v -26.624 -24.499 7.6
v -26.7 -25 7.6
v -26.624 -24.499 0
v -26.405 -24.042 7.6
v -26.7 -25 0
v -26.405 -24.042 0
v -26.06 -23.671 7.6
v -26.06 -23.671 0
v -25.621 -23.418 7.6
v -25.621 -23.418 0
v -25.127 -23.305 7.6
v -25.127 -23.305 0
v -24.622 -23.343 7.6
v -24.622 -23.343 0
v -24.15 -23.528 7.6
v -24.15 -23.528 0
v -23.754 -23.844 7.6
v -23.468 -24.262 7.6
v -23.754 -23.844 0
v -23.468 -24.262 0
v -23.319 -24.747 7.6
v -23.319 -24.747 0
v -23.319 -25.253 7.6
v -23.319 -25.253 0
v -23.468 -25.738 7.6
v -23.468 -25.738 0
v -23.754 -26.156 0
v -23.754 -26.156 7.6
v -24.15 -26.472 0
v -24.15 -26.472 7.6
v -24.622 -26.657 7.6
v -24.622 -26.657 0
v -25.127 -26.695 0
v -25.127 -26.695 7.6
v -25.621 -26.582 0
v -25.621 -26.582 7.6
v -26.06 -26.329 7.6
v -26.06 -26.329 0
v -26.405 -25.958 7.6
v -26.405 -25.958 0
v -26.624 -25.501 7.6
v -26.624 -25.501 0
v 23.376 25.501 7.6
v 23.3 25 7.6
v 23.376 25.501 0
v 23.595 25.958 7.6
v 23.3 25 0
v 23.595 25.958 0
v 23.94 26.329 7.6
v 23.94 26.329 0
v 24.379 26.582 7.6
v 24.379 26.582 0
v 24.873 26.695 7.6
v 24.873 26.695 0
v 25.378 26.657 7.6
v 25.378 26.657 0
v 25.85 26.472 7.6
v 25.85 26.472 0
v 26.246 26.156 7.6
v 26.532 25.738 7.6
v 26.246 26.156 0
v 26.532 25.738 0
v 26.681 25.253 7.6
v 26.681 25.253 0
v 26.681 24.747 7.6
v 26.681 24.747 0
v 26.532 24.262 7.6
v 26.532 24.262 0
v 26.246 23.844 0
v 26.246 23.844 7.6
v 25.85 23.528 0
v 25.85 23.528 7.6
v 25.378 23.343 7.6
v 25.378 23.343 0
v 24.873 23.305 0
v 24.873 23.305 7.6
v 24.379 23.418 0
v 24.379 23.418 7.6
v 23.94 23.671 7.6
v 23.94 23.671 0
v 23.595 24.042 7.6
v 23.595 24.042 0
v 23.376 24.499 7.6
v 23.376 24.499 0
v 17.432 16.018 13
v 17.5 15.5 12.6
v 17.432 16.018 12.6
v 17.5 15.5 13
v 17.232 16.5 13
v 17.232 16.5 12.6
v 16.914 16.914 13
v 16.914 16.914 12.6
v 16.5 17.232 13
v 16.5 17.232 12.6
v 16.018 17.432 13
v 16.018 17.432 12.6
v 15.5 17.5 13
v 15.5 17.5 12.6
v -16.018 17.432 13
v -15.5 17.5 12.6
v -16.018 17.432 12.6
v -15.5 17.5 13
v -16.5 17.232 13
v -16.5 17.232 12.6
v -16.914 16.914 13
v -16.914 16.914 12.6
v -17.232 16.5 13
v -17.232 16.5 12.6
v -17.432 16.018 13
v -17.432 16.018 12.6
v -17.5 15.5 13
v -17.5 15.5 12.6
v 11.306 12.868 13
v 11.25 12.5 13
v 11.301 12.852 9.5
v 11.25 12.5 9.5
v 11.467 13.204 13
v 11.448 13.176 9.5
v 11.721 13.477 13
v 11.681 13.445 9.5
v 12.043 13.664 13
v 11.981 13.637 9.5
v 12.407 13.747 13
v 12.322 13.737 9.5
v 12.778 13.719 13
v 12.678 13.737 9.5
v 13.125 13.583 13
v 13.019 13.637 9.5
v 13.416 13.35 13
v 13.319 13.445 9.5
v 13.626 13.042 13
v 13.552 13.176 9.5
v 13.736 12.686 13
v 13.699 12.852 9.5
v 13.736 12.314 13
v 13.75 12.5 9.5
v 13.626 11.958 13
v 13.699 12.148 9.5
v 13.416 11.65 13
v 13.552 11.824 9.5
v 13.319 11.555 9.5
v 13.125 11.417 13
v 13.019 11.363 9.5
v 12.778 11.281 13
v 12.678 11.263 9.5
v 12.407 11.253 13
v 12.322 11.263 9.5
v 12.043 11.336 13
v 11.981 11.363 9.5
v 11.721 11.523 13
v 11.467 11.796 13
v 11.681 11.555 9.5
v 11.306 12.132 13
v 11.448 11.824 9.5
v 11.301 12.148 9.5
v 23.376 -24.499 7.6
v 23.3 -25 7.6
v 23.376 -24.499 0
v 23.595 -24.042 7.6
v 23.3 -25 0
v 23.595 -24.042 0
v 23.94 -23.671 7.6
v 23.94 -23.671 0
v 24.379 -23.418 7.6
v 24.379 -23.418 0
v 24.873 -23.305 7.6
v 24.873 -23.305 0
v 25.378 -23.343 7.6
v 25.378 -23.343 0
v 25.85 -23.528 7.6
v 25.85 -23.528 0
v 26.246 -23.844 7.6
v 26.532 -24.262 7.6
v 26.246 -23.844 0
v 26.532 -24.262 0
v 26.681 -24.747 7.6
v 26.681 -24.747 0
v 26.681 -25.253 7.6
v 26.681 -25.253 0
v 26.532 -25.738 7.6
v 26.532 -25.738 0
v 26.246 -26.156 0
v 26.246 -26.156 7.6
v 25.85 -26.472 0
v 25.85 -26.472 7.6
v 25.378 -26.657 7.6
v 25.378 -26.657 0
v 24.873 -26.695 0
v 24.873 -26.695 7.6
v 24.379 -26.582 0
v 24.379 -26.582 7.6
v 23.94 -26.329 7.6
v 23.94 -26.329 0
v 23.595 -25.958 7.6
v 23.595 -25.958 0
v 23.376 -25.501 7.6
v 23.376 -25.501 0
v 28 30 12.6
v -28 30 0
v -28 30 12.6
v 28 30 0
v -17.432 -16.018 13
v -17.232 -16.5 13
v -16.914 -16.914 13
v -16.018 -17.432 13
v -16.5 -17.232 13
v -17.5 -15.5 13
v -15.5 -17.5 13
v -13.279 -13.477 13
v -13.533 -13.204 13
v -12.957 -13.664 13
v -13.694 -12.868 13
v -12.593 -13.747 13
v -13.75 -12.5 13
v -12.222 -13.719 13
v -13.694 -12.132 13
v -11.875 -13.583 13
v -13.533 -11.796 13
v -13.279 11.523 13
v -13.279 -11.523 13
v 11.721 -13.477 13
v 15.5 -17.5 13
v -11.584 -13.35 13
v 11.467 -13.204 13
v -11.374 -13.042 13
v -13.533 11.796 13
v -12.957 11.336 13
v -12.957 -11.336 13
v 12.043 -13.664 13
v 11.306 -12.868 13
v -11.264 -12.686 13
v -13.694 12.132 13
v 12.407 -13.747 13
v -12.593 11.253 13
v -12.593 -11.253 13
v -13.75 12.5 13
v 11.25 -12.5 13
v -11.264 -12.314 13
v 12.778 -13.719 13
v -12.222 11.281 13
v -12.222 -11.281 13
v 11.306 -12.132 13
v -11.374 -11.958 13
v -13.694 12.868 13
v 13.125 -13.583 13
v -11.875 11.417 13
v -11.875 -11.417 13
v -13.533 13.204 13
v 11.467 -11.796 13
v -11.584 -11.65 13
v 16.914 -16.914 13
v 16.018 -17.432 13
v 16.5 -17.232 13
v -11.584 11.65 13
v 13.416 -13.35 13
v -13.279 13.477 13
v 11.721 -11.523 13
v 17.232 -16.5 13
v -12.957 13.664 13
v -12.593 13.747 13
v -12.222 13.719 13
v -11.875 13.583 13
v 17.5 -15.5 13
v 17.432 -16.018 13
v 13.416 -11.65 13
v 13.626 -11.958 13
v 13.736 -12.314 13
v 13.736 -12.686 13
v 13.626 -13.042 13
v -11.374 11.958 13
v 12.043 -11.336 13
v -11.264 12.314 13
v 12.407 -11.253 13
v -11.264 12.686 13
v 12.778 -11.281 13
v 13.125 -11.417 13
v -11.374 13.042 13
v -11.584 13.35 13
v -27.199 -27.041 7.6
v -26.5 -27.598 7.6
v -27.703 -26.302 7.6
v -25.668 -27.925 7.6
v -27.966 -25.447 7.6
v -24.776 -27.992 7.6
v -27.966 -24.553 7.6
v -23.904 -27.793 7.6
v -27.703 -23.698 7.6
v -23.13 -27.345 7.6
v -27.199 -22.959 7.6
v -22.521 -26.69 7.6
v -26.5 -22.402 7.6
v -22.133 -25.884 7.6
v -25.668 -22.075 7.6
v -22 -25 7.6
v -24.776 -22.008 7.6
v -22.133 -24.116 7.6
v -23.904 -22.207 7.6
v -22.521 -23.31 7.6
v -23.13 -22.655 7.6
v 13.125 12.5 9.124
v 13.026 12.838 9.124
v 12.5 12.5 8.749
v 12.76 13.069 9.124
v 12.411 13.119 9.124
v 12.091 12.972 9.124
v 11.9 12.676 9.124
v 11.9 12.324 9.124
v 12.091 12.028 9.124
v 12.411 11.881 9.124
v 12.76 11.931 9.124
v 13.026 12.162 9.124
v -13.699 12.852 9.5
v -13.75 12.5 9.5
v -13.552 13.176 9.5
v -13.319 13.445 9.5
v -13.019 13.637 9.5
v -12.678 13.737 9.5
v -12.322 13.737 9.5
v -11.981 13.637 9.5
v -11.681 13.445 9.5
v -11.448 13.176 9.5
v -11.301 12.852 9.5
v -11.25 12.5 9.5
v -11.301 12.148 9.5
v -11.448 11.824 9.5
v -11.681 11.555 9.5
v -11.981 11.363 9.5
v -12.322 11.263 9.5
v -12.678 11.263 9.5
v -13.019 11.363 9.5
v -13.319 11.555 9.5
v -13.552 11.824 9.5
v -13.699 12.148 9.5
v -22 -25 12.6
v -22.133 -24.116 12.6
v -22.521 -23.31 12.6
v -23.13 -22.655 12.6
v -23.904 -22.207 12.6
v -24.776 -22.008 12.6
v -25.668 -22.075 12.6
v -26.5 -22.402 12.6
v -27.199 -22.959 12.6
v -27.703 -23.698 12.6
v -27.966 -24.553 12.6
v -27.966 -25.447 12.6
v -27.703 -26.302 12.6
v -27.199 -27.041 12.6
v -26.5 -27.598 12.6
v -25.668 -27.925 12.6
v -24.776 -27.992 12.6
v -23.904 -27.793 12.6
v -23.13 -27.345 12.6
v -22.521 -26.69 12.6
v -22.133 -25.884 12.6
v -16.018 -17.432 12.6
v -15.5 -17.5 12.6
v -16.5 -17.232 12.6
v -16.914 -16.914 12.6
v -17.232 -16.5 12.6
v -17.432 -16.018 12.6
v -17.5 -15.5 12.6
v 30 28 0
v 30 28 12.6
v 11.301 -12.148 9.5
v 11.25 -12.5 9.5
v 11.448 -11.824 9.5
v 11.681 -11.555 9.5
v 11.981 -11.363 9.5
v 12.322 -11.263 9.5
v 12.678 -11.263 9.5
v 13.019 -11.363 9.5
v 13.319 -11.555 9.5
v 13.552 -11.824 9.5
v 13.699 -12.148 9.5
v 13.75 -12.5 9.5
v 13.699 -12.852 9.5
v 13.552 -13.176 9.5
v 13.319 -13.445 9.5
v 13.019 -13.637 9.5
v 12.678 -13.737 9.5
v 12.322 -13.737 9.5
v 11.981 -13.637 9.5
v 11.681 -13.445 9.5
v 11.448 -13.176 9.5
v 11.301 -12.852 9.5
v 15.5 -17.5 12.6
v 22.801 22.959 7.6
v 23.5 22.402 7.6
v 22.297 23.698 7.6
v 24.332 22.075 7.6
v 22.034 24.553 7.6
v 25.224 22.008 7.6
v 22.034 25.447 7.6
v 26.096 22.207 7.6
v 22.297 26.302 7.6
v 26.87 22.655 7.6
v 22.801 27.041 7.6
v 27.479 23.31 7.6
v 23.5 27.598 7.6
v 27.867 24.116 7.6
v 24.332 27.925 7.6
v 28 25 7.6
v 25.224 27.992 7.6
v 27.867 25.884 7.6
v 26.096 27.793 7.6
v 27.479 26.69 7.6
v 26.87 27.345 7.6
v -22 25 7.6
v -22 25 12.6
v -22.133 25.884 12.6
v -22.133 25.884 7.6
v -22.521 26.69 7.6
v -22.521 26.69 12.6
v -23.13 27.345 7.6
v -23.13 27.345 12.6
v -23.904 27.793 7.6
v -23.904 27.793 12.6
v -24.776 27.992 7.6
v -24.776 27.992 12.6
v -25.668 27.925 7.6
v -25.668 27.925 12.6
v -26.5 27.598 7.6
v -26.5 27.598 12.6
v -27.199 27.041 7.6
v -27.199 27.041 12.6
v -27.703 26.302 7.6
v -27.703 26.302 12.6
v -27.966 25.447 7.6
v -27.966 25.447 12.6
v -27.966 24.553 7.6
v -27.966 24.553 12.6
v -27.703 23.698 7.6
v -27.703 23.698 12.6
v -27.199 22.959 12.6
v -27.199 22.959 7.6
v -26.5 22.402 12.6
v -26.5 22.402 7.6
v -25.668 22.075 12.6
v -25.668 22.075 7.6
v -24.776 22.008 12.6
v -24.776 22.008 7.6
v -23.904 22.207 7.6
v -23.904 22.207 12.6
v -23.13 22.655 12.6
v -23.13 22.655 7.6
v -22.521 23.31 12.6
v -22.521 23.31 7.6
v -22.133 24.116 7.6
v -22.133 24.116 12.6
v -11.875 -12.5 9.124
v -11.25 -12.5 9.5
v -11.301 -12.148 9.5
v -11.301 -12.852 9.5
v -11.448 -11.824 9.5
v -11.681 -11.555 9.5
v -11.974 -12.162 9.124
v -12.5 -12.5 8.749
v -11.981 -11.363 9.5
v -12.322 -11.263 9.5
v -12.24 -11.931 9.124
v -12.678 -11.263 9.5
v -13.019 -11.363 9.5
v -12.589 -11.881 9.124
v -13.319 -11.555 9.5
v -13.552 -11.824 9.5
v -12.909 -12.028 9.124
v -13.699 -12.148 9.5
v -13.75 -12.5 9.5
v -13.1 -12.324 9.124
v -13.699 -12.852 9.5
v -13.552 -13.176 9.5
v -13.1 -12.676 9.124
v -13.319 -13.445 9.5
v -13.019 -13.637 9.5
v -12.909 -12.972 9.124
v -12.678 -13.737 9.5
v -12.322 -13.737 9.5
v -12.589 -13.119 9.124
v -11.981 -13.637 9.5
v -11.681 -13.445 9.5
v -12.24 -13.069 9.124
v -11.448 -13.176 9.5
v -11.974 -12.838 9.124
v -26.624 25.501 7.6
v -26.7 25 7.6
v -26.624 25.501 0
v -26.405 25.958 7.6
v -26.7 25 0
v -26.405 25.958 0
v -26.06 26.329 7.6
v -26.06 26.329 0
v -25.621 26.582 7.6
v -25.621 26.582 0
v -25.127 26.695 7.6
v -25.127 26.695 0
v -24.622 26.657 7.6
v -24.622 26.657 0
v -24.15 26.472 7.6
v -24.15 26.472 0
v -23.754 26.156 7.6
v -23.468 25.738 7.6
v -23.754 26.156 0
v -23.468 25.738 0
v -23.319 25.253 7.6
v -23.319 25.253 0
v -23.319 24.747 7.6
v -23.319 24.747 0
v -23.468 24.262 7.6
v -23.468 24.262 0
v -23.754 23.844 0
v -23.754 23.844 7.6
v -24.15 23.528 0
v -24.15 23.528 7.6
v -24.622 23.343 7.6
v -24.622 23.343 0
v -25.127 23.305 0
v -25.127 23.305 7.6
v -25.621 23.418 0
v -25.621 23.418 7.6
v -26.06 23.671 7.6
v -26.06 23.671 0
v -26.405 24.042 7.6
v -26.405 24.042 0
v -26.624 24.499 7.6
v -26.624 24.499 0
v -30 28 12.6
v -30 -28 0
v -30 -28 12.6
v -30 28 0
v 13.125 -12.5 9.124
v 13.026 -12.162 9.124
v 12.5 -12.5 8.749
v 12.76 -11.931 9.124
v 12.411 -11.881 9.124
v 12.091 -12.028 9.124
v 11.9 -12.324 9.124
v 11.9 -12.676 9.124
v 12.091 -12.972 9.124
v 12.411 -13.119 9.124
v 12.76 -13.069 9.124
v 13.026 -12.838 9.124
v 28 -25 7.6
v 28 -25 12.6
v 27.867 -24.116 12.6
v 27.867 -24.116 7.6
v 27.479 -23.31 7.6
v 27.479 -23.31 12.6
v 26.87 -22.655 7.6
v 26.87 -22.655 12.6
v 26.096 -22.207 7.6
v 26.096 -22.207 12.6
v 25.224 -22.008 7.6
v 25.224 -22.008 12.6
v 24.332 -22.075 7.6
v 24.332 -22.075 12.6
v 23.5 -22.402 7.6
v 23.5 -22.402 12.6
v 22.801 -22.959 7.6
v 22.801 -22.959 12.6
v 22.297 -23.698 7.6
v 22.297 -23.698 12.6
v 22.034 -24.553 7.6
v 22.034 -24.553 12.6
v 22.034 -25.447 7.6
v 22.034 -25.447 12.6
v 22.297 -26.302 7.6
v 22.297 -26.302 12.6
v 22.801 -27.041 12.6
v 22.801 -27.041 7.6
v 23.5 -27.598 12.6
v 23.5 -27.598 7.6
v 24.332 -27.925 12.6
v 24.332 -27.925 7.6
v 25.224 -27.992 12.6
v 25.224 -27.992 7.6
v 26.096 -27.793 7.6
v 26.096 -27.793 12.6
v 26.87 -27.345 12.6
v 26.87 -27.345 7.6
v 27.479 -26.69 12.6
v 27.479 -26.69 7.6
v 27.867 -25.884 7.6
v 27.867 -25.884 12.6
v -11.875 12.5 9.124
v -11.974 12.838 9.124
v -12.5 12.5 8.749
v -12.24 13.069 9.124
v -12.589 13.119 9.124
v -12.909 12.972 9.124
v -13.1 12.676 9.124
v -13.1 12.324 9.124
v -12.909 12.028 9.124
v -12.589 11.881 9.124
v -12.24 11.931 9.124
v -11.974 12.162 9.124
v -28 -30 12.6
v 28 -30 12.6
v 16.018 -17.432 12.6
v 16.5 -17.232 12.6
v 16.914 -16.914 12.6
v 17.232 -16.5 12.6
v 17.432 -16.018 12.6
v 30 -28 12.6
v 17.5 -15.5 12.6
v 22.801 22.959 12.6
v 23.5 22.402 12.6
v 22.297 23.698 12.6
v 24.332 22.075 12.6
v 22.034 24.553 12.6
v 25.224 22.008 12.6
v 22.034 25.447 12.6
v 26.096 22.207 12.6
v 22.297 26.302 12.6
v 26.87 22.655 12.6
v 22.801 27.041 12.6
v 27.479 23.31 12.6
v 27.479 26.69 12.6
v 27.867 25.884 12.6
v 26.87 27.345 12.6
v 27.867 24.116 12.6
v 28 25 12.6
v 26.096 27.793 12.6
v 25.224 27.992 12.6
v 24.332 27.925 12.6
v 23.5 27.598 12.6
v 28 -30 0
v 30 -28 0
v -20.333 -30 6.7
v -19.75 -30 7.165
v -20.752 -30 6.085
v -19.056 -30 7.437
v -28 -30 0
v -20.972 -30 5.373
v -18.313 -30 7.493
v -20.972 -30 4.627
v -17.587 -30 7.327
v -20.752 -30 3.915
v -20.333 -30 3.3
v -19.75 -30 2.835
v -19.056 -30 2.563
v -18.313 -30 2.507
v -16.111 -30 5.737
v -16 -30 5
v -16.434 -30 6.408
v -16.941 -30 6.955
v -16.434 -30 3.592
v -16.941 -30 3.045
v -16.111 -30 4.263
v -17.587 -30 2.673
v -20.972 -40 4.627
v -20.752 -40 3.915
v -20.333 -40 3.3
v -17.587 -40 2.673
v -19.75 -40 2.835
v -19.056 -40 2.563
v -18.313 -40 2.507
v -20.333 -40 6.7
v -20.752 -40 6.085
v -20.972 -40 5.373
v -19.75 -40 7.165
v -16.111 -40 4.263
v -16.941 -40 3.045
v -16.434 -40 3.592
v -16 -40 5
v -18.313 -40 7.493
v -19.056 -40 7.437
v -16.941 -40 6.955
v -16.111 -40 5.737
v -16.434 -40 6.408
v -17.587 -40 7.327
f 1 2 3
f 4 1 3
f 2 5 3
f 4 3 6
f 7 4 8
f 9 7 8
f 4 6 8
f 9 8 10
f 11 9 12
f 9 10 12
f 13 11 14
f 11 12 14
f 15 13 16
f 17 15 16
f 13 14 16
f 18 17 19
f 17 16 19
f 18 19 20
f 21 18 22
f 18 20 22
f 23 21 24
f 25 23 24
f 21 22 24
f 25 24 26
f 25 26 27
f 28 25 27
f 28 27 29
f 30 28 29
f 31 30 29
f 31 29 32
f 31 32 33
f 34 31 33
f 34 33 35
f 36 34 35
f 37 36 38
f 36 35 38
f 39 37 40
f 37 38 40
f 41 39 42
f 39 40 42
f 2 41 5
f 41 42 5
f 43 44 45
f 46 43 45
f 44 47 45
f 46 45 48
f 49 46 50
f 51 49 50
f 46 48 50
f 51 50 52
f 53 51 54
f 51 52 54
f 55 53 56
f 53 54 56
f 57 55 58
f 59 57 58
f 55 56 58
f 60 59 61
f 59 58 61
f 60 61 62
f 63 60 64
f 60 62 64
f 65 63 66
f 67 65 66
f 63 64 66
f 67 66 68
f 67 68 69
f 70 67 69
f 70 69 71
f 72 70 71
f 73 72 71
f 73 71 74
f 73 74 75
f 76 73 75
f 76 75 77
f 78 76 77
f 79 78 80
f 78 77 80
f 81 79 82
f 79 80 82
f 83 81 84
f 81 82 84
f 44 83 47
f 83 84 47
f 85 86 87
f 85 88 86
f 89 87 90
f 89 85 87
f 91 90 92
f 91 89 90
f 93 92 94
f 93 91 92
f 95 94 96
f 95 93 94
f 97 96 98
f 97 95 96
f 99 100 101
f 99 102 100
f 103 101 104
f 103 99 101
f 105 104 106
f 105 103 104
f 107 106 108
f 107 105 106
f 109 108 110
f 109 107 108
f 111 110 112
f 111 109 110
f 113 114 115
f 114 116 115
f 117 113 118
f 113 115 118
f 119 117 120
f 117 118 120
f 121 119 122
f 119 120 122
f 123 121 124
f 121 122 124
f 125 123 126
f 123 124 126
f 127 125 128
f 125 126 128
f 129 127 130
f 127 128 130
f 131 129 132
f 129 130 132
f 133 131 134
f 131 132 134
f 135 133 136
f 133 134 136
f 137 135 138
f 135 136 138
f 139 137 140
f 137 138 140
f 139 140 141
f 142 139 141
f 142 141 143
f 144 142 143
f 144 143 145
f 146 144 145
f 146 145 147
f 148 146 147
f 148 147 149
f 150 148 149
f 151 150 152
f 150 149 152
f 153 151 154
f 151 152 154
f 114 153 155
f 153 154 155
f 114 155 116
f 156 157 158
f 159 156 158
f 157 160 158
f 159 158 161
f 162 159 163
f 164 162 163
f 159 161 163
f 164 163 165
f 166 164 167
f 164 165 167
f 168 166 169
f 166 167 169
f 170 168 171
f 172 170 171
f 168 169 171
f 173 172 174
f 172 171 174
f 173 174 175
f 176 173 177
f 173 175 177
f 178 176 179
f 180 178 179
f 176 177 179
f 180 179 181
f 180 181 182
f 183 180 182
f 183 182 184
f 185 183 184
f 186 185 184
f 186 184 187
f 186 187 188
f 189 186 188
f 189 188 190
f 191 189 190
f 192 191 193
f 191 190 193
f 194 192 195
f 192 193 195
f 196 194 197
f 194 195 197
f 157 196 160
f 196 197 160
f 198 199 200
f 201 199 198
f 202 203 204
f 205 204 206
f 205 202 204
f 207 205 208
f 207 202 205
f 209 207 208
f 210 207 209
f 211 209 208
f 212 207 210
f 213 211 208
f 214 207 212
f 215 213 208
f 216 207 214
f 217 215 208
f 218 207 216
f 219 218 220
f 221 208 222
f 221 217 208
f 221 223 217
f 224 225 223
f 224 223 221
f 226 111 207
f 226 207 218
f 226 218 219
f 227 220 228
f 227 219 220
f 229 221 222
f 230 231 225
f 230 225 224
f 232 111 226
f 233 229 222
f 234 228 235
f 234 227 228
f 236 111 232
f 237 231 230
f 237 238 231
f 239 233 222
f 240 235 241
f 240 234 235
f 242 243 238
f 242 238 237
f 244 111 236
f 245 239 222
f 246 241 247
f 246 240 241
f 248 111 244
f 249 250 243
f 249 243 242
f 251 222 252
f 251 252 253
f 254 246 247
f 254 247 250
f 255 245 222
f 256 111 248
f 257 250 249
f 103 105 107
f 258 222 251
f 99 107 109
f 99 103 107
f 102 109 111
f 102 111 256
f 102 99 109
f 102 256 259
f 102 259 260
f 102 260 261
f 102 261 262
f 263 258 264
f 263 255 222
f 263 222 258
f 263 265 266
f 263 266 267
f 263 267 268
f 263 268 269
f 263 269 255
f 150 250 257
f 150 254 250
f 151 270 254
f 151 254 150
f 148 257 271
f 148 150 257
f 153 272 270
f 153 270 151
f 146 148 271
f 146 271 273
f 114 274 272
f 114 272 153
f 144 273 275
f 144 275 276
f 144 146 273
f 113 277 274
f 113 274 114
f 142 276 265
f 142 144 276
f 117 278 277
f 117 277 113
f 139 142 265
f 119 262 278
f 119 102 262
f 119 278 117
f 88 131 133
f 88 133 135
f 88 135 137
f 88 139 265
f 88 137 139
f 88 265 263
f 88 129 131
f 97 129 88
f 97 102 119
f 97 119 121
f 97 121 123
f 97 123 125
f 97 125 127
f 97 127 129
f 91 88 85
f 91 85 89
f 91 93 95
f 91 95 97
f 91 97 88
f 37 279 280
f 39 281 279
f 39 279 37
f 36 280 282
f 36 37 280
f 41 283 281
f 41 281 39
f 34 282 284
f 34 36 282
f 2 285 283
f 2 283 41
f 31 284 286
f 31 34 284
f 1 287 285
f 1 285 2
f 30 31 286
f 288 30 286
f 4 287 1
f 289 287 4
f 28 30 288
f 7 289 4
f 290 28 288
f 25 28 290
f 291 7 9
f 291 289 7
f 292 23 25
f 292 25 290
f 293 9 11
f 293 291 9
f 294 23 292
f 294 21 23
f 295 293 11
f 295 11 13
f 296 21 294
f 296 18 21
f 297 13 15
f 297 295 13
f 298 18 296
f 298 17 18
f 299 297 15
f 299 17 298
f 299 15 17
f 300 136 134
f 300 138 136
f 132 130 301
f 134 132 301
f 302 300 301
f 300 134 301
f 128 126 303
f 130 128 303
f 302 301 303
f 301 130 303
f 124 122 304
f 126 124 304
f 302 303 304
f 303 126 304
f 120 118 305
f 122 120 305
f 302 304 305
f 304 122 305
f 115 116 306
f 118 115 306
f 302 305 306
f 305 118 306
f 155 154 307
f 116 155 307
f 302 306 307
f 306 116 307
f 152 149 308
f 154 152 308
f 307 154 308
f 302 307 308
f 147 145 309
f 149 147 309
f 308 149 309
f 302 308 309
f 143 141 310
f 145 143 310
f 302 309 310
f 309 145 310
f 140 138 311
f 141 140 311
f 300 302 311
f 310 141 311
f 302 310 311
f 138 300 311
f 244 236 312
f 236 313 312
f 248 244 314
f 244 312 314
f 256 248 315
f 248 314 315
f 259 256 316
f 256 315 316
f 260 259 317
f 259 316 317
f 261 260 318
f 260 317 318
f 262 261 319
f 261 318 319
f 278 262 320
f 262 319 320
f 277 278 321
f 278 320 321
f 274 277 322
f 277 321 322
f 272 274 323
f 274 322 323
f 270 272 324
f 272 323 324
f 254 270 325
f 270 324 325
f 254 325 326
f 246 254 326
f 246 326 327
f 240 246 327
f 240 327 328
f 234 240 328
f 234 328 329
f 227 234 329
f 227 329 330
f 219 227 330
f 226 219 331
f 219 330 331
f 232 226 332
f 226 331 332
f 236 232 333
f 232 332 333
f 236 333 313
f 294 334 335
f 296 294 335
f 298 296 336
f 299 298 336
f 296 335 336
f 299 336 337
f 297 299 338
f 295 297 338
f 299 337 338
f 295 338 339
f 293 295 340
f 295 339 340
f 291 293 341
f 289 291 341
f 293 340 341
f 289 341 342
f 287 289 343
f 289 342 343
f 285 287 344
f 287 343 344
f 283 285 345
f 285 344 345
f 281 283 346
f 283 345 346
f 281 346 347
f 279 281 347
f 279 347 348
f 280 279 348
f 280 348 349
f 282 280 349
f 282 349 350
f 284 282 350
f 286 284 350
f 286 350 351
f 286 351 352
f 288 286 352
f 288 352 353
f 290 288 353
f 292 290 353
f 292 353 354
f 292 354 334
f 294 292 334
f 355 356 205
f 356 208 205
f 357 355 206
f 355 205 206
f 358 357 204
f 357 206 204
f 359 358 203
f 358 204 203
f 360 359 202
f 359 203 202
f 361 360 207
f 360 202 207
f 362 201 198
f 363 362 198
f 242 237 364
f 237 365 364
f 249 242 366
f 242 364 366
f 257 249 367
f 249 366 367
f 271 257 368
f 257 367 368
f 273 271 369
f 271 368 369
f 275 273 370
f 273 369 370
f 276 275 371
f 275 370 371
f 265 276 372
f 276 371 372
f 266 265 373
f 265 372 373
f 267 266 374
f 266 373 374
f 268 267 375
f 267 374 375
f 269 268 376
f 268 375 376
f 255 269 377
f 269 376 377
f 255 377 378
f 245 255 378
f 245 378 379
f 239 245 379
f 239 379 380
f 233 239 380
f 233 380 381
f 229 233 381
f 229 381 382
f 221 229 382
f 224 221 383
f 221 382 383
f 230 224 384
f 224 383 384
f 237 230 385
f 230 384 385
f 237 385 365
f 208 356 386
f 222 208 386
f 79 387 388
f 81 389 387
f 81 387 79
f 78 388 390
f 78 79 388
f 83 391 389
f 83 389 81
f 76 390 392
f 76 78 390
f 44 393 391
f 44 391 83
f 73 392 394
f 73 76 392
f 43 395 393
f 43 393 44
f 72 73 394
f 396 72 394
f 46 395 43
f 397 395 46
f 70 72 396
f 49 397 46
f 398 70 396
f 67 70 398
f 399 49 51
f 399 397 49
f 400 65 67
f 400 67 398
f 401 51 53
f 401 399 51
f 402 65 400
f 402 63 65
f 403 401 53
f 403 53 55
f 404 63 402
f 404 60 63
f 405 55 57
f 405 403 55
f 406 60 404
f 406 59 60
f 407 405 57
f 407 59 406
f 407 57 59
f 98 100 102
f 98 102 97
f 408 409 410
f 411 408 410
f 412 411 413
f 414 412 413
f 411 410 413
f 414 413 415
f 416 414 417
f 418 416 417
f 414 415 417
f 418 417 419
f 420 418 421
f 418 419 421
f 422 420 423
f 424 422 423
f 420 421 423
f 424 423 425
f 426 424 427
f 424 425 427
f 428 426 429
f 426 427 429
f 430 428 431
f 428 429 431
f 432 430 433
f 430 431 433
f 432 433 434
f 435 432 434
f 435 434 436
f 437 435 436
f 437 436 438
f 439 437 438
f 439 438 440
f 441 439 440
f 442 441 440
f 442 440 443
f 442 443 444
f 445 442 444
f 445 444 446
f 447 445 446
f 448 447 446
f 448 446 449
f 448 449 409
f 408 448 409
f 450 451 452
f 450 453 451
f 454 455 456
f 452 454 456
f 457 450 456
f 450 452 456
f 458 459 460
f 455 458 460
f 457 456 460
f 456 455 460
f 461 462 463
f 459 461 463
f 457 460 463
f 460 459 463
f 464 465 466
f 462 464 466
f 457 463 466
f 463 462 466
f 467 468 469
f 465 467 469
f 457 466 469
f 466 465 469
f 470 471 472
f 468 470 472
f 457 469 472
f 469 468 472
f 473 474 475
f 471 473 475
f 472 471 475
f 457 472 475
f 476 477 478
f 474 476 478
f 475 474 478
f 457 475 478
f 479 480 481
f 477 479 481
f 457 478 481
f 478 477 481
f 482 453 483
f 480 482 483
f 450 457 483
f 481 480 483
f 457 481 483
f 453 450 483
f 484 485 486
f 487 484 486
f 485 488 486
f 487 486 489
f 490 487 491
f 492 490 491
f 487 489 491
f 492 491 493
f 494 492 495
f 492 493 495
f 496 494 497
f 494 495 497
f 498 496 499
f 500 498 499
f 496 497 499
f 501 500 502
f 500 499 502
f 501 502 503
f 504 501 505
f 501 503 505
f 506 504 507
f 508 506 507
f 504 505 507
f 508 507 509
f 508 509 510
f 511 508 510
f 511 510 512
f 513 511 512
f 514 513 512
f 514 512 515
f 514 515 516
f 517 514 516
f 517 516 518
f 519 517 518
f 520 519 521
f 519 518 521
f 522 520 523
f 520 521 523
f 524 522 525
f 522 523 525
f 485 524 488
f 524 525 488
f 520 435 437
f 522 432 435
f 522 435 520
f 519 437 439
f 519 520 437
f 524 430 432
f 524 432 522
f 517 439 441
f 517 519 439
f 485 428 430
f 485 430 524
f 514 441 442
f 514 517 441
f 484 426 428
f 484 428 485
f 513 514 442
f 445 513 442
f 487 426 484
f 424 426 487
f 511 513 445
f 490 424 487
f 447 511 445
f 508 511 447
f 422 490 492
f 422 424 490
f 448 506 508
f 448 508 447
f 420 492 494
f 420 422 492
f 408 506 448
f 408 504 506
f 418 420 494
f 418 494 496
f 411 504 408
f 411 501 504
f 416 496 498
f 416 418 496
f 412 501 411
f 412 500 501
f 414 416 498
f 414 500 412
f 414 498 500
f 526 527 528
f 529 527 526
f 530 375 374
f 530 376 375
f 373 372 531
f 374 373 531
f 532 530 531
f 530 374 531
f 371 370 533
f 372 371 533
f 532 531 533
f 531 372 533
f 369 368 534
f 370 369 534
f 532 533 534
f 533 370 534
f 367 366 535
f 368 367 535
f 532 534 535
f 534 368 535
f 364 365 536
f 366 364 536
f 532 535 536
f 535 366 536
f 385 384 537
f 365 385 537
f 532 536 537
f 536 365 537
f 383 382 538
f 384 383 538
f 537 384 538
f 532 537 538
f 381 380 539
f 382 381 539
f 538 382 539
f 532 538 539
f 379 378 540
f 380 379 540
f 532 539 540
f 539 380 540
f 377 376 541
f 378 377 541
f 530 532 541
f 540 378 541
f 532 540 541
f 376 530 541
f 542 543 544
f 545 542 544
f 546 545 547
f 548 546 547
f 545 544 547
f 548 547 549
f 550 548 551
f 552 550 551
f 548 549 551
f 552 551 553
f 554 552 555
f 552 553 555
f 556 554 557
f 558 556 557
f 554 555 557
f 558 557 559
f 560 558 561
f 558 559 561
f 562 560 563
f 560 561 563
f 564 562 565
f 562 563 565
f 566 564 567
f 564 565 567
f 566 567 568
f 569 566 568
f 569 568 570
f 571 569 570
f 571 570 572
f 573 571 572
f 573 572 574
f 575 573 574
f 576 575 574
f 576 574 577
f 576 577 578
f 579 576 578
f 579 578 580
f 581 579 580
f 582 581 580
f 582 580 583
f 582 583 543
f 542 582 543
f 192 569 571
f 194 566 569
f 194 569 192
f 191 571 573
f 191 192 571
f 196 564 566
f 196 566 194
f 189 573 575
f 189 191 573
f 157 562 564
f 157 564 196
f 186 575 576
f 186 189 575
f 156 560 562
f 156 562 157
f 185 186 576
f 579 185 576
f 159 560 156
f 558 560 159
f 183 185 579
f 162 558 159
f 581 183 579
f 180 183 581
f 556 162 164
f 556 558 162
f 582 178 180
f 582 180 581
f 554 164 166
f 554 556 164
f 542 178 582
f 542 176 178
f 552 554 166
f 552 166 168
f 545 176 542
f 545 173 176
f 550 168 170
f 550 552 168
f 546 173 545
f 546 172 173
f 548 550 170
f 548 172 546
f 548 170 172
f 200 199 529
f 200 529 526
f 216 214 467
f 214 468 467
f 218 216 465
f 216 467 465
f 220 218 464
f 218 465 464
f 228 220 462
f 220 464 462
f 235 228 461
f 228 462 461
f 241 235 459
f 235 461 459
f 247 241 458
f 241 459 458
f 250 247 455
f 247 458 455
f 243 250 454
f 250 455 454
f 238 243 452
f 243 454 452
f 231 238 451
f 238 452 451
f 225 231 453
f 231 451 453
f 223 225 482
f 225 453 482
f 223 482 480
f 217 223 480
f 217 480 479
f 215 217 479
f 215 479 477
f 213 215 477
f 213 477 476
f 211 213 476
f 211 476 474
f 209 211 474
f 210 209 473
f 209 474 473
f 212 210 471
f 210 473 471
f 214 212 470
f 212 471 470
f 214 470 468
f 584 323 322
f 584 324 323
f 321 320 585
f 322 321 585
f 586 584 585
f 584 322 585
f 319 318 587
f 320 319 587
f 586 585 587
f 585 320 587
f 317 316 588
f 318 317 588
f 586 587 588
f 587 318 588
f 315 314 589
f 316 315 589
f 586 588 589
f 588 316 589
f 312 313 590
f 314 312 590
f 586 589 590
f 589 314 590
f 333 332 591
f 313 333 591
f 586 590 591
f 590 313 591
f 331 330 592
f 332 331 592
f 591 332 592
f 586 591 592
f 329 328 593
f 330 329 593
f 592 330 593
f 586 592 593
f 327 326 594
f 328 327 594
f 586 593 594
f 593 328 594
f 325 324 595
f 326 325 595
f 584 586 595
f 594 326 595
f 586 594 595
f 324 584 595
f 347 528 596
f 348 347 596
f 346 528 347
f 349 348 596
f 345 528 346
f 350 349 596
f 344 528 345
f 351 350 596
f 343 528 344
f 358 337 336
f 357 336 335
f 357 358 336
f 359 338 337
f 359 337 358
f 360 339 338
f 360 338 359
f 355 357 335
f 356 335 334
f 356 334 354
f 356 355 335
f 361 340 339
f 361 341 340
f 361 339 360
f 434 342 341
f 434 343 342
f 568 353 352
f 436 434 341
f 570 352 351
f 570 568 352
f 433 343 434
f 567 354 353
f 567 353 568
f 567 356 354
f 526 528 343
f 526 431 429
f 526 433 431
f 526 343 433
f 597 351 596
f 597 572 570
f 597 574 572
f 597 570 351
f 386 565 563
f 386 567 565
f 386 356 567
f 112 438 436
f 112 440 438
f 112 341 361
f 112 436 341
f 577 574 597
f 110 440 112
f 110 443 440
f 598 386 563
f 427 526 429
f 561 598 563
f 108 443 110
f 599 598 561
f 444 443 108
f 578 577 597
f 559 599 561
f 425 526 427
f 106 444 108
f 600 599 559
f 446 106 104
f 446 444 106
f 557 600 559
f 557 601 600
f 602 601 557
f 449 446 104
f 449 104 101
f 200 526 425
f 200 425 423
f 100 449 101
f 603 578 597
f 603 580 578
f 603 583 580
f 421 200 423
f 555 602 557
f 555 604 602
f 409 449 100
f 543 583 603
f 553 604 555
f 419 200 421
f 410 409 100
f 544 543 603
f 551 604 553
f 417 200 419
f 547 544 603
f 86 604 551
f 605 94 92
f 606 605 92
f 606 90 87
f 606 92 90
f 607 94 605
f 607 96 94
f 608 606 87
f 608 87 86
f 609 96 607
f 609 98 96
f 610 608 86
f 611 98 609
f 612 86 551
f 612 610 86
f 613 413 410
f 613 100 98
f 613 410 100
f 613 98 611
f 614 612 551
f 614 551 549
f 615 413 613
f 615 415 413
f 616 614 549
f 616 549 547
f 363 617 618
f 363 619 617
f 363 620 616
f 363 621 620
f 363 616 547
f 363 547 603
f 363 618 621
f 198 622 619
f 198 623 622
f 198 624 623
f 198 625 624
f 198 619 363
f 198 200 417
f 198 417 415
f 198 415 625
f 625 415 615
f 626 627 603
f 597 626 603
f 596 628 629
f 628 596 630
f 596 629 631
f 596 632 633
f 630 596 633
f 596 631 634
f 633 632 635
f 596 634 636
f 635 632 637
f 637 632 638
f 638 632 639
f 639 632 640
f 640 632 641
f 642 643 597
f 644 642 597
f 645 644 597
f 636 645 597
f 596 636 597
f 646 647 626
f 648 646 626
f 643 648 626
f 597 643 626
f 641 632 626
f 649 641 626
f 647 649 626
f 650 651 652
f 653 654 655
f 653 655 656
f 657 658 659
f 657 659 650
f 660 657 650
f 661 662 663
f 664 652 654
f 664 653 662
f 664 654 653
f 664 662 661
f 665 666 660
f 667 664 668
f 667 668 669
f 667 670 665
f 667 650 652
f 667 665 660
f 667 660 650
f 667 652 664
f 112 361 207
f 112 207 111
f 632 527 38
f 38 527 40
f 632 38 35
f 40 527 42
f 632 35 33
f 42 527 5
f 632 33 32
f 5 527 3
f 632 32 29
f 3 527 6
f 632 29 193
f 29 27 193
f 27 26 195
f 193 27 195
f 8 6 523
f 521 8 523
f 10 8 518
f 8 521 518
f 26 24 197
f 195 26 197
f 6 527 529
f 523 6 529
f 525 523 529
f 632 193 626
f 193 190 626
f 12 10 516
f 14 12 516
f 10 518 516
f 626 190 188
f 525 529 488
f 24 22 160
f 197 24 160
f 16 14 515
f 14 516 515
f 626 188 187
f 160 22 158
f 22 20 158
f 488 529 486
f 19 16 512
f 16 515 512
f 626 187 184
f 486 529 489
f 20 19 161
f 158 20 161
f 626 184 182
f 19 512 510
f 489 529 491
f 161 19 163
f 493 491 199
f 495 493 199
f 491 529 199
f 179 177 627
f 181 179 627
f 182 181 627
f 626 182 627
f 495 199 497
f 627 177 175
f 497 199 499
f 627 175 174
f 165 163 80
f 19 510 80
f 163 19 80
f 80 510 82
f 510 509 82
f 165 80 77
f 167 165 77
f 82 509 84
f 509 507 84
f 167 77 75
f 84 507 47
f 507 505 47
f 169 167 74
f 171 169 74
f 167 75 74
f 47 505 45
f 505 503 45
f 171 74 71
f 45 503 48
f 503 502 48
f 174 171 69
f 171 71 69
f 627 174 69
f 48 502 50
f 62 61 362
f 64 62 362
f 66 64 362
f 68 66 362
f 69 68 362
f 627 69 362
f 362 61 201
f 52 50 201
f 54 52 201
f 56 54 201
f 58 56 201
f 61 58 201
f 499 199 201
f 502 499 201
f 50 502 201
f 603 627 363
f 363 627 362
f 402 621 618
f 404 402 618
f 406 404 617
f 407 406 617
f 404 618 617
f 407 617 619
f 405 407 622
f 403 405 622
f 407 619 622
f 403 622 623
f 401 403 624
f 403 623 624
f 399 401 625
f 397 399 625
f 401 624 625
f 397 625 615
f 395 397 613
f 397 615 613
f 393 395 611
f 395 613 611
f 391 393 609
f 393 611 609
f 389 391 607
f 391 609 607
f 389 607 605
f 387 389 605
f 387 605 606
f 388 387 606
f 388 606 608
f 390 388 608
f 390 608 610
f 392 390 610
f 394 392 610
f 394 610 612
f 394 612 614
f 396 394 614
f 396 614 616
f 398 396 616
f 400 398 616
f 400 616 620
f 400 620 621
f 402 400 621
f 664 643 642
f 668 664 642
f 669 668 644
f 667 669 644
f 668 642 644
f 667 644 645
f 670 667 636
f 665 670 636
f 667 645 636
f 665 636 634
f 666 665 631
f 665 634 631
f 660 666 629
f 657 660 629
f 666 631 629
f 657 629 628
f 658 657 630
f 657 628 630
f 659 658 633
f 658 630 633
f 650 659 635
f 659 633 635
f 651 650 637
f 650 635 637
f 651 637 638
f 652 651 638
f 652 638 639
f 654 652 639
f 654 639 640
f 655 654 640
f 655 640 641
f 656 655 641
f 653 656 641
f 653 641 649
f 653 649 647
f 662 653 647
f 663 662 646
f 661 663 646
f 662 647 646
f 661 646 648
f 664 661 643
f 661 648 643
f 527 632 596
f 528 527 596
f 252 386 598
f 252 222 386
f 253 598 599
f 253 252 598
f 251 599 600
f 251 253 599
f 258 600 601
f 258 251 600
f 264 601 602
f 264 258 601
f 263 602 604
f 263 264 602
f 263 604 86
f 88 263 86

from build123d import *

# Parameters (mm, degrees)
SKETCH_1_W                = 60
SKETCH_1_H                = 60
EXTRUDE_1_DEPTH           = 12.6
CHAMFER_1_SIZE            = 2
SKETCH_2_W                = 35
SKETCH_2_H                = 35
EXTRUDE_2_DEPTH           = 0.4
FILLET_1_R                = 2
HOLE_WIZARD_1_D           = 3.4
HOLE_WIZARD_1_CBORE_D     = 6
HOLE_WIZARD_1_CBORE_DEPTH = 5
HOLE_WIZARD_M3_1_D        = 2.5
HOLE_WIZARD_M3_1_DEPTH    = 3.5
HOLE_WIZARD_M3_1_TIP      = 0.751075774
SKETCH_7_R                = 2.5
EXTRUDE_3_DEPTH           = 10


with BuildPart() as part:
    # 草图1 → 凸台-拉伸1 (new body)
    with BuildSketch(Plane.XY):
        Rectangle(SKETCH_1_W, SKETCH_1_H)
    extrude(amount=EXTRUDE_1_DEPTH)

    # 倒角1
    chamfer_1_edges = [part.edges().sort_by_distance(p)[0] for p in [
        (30, -30, 6.3),
        (-30, -30, 6.3),
        (-30, 30, 6.3),
        (30, 30, 6.3),
    ]]
    chamfer(chamfer_1_edges, length=CHAMFER_1_SIZE)

    # 草图2 → 凸台-拉伸2 (add)
    with BuildSketch(Plane.XY.offset(12.6)):
        Rectangle(SKETCH_2_W, SKETCH_2_H)
    extrude(amount=EXTRUDE_2_DEPTH)

    # 圆角1
    fillet_1_edges = [part.edges().sort_by_distance(p)[0] for p in [
        (17.5, -17.5, 12.8),
        (17.5, 17.5, 12.8),
        (-17.5, 17.5, 12.8),
        (-17.5, -17.5, 12.8),
    ]]
    fillet(fillet_1_edges, radius=FILLET_1_R)

    # 孔1 (through all)
    with Locations(Plane(origin=(-25, 25, 12.6), x_dir=(1, 0, 0), z_dir=(0, 0, 1))):
        with Locations((0, 0), (50, 0), (0, -50), (50, -50)):
            CounterBoreHole(HOLE_WIZARD_1_D / 2, HOLE_WIZARD_1_CBORE_D / 2, HOLE_WIZARD_1_CBORE_DEPTH)

    # M3 螺纹孔1
    with Locations(Plane(origin=(-12.5, 12.5, 13), x_dir=(1, 0, 0), z_dir=(0, 0, 1))):
        with Locations((0, 0), (25, 0), (25, -25), (0, -25)):
            Hole(HOLE_WIZARD_M3_1_D / 2, depth=HOLE_WIZARD_M3_1_DEPTH)
            with Locations((0, 0, -(HOLE_WIZARD_M3_1_DEPTH + HOLE_WIZARD_M3_1_TIP / 2))):  # 118° drill point
                Cone(0, HOLE_WIZARD_M3_1_D / 2, HOLE_WIZARD_M3_1_TIP, mode=Mode.SUBTRACT)

    # 草图7 → 凸台-拉伸3 (add)
    with BuildSketch(Plane.XZ.offset(30)):
        with Locations((-18.5, 5)):
            Circle(SKETCH_7_R)
    extrude(amount=EXTRUDE_3_DEPTH)


solid = part.part
